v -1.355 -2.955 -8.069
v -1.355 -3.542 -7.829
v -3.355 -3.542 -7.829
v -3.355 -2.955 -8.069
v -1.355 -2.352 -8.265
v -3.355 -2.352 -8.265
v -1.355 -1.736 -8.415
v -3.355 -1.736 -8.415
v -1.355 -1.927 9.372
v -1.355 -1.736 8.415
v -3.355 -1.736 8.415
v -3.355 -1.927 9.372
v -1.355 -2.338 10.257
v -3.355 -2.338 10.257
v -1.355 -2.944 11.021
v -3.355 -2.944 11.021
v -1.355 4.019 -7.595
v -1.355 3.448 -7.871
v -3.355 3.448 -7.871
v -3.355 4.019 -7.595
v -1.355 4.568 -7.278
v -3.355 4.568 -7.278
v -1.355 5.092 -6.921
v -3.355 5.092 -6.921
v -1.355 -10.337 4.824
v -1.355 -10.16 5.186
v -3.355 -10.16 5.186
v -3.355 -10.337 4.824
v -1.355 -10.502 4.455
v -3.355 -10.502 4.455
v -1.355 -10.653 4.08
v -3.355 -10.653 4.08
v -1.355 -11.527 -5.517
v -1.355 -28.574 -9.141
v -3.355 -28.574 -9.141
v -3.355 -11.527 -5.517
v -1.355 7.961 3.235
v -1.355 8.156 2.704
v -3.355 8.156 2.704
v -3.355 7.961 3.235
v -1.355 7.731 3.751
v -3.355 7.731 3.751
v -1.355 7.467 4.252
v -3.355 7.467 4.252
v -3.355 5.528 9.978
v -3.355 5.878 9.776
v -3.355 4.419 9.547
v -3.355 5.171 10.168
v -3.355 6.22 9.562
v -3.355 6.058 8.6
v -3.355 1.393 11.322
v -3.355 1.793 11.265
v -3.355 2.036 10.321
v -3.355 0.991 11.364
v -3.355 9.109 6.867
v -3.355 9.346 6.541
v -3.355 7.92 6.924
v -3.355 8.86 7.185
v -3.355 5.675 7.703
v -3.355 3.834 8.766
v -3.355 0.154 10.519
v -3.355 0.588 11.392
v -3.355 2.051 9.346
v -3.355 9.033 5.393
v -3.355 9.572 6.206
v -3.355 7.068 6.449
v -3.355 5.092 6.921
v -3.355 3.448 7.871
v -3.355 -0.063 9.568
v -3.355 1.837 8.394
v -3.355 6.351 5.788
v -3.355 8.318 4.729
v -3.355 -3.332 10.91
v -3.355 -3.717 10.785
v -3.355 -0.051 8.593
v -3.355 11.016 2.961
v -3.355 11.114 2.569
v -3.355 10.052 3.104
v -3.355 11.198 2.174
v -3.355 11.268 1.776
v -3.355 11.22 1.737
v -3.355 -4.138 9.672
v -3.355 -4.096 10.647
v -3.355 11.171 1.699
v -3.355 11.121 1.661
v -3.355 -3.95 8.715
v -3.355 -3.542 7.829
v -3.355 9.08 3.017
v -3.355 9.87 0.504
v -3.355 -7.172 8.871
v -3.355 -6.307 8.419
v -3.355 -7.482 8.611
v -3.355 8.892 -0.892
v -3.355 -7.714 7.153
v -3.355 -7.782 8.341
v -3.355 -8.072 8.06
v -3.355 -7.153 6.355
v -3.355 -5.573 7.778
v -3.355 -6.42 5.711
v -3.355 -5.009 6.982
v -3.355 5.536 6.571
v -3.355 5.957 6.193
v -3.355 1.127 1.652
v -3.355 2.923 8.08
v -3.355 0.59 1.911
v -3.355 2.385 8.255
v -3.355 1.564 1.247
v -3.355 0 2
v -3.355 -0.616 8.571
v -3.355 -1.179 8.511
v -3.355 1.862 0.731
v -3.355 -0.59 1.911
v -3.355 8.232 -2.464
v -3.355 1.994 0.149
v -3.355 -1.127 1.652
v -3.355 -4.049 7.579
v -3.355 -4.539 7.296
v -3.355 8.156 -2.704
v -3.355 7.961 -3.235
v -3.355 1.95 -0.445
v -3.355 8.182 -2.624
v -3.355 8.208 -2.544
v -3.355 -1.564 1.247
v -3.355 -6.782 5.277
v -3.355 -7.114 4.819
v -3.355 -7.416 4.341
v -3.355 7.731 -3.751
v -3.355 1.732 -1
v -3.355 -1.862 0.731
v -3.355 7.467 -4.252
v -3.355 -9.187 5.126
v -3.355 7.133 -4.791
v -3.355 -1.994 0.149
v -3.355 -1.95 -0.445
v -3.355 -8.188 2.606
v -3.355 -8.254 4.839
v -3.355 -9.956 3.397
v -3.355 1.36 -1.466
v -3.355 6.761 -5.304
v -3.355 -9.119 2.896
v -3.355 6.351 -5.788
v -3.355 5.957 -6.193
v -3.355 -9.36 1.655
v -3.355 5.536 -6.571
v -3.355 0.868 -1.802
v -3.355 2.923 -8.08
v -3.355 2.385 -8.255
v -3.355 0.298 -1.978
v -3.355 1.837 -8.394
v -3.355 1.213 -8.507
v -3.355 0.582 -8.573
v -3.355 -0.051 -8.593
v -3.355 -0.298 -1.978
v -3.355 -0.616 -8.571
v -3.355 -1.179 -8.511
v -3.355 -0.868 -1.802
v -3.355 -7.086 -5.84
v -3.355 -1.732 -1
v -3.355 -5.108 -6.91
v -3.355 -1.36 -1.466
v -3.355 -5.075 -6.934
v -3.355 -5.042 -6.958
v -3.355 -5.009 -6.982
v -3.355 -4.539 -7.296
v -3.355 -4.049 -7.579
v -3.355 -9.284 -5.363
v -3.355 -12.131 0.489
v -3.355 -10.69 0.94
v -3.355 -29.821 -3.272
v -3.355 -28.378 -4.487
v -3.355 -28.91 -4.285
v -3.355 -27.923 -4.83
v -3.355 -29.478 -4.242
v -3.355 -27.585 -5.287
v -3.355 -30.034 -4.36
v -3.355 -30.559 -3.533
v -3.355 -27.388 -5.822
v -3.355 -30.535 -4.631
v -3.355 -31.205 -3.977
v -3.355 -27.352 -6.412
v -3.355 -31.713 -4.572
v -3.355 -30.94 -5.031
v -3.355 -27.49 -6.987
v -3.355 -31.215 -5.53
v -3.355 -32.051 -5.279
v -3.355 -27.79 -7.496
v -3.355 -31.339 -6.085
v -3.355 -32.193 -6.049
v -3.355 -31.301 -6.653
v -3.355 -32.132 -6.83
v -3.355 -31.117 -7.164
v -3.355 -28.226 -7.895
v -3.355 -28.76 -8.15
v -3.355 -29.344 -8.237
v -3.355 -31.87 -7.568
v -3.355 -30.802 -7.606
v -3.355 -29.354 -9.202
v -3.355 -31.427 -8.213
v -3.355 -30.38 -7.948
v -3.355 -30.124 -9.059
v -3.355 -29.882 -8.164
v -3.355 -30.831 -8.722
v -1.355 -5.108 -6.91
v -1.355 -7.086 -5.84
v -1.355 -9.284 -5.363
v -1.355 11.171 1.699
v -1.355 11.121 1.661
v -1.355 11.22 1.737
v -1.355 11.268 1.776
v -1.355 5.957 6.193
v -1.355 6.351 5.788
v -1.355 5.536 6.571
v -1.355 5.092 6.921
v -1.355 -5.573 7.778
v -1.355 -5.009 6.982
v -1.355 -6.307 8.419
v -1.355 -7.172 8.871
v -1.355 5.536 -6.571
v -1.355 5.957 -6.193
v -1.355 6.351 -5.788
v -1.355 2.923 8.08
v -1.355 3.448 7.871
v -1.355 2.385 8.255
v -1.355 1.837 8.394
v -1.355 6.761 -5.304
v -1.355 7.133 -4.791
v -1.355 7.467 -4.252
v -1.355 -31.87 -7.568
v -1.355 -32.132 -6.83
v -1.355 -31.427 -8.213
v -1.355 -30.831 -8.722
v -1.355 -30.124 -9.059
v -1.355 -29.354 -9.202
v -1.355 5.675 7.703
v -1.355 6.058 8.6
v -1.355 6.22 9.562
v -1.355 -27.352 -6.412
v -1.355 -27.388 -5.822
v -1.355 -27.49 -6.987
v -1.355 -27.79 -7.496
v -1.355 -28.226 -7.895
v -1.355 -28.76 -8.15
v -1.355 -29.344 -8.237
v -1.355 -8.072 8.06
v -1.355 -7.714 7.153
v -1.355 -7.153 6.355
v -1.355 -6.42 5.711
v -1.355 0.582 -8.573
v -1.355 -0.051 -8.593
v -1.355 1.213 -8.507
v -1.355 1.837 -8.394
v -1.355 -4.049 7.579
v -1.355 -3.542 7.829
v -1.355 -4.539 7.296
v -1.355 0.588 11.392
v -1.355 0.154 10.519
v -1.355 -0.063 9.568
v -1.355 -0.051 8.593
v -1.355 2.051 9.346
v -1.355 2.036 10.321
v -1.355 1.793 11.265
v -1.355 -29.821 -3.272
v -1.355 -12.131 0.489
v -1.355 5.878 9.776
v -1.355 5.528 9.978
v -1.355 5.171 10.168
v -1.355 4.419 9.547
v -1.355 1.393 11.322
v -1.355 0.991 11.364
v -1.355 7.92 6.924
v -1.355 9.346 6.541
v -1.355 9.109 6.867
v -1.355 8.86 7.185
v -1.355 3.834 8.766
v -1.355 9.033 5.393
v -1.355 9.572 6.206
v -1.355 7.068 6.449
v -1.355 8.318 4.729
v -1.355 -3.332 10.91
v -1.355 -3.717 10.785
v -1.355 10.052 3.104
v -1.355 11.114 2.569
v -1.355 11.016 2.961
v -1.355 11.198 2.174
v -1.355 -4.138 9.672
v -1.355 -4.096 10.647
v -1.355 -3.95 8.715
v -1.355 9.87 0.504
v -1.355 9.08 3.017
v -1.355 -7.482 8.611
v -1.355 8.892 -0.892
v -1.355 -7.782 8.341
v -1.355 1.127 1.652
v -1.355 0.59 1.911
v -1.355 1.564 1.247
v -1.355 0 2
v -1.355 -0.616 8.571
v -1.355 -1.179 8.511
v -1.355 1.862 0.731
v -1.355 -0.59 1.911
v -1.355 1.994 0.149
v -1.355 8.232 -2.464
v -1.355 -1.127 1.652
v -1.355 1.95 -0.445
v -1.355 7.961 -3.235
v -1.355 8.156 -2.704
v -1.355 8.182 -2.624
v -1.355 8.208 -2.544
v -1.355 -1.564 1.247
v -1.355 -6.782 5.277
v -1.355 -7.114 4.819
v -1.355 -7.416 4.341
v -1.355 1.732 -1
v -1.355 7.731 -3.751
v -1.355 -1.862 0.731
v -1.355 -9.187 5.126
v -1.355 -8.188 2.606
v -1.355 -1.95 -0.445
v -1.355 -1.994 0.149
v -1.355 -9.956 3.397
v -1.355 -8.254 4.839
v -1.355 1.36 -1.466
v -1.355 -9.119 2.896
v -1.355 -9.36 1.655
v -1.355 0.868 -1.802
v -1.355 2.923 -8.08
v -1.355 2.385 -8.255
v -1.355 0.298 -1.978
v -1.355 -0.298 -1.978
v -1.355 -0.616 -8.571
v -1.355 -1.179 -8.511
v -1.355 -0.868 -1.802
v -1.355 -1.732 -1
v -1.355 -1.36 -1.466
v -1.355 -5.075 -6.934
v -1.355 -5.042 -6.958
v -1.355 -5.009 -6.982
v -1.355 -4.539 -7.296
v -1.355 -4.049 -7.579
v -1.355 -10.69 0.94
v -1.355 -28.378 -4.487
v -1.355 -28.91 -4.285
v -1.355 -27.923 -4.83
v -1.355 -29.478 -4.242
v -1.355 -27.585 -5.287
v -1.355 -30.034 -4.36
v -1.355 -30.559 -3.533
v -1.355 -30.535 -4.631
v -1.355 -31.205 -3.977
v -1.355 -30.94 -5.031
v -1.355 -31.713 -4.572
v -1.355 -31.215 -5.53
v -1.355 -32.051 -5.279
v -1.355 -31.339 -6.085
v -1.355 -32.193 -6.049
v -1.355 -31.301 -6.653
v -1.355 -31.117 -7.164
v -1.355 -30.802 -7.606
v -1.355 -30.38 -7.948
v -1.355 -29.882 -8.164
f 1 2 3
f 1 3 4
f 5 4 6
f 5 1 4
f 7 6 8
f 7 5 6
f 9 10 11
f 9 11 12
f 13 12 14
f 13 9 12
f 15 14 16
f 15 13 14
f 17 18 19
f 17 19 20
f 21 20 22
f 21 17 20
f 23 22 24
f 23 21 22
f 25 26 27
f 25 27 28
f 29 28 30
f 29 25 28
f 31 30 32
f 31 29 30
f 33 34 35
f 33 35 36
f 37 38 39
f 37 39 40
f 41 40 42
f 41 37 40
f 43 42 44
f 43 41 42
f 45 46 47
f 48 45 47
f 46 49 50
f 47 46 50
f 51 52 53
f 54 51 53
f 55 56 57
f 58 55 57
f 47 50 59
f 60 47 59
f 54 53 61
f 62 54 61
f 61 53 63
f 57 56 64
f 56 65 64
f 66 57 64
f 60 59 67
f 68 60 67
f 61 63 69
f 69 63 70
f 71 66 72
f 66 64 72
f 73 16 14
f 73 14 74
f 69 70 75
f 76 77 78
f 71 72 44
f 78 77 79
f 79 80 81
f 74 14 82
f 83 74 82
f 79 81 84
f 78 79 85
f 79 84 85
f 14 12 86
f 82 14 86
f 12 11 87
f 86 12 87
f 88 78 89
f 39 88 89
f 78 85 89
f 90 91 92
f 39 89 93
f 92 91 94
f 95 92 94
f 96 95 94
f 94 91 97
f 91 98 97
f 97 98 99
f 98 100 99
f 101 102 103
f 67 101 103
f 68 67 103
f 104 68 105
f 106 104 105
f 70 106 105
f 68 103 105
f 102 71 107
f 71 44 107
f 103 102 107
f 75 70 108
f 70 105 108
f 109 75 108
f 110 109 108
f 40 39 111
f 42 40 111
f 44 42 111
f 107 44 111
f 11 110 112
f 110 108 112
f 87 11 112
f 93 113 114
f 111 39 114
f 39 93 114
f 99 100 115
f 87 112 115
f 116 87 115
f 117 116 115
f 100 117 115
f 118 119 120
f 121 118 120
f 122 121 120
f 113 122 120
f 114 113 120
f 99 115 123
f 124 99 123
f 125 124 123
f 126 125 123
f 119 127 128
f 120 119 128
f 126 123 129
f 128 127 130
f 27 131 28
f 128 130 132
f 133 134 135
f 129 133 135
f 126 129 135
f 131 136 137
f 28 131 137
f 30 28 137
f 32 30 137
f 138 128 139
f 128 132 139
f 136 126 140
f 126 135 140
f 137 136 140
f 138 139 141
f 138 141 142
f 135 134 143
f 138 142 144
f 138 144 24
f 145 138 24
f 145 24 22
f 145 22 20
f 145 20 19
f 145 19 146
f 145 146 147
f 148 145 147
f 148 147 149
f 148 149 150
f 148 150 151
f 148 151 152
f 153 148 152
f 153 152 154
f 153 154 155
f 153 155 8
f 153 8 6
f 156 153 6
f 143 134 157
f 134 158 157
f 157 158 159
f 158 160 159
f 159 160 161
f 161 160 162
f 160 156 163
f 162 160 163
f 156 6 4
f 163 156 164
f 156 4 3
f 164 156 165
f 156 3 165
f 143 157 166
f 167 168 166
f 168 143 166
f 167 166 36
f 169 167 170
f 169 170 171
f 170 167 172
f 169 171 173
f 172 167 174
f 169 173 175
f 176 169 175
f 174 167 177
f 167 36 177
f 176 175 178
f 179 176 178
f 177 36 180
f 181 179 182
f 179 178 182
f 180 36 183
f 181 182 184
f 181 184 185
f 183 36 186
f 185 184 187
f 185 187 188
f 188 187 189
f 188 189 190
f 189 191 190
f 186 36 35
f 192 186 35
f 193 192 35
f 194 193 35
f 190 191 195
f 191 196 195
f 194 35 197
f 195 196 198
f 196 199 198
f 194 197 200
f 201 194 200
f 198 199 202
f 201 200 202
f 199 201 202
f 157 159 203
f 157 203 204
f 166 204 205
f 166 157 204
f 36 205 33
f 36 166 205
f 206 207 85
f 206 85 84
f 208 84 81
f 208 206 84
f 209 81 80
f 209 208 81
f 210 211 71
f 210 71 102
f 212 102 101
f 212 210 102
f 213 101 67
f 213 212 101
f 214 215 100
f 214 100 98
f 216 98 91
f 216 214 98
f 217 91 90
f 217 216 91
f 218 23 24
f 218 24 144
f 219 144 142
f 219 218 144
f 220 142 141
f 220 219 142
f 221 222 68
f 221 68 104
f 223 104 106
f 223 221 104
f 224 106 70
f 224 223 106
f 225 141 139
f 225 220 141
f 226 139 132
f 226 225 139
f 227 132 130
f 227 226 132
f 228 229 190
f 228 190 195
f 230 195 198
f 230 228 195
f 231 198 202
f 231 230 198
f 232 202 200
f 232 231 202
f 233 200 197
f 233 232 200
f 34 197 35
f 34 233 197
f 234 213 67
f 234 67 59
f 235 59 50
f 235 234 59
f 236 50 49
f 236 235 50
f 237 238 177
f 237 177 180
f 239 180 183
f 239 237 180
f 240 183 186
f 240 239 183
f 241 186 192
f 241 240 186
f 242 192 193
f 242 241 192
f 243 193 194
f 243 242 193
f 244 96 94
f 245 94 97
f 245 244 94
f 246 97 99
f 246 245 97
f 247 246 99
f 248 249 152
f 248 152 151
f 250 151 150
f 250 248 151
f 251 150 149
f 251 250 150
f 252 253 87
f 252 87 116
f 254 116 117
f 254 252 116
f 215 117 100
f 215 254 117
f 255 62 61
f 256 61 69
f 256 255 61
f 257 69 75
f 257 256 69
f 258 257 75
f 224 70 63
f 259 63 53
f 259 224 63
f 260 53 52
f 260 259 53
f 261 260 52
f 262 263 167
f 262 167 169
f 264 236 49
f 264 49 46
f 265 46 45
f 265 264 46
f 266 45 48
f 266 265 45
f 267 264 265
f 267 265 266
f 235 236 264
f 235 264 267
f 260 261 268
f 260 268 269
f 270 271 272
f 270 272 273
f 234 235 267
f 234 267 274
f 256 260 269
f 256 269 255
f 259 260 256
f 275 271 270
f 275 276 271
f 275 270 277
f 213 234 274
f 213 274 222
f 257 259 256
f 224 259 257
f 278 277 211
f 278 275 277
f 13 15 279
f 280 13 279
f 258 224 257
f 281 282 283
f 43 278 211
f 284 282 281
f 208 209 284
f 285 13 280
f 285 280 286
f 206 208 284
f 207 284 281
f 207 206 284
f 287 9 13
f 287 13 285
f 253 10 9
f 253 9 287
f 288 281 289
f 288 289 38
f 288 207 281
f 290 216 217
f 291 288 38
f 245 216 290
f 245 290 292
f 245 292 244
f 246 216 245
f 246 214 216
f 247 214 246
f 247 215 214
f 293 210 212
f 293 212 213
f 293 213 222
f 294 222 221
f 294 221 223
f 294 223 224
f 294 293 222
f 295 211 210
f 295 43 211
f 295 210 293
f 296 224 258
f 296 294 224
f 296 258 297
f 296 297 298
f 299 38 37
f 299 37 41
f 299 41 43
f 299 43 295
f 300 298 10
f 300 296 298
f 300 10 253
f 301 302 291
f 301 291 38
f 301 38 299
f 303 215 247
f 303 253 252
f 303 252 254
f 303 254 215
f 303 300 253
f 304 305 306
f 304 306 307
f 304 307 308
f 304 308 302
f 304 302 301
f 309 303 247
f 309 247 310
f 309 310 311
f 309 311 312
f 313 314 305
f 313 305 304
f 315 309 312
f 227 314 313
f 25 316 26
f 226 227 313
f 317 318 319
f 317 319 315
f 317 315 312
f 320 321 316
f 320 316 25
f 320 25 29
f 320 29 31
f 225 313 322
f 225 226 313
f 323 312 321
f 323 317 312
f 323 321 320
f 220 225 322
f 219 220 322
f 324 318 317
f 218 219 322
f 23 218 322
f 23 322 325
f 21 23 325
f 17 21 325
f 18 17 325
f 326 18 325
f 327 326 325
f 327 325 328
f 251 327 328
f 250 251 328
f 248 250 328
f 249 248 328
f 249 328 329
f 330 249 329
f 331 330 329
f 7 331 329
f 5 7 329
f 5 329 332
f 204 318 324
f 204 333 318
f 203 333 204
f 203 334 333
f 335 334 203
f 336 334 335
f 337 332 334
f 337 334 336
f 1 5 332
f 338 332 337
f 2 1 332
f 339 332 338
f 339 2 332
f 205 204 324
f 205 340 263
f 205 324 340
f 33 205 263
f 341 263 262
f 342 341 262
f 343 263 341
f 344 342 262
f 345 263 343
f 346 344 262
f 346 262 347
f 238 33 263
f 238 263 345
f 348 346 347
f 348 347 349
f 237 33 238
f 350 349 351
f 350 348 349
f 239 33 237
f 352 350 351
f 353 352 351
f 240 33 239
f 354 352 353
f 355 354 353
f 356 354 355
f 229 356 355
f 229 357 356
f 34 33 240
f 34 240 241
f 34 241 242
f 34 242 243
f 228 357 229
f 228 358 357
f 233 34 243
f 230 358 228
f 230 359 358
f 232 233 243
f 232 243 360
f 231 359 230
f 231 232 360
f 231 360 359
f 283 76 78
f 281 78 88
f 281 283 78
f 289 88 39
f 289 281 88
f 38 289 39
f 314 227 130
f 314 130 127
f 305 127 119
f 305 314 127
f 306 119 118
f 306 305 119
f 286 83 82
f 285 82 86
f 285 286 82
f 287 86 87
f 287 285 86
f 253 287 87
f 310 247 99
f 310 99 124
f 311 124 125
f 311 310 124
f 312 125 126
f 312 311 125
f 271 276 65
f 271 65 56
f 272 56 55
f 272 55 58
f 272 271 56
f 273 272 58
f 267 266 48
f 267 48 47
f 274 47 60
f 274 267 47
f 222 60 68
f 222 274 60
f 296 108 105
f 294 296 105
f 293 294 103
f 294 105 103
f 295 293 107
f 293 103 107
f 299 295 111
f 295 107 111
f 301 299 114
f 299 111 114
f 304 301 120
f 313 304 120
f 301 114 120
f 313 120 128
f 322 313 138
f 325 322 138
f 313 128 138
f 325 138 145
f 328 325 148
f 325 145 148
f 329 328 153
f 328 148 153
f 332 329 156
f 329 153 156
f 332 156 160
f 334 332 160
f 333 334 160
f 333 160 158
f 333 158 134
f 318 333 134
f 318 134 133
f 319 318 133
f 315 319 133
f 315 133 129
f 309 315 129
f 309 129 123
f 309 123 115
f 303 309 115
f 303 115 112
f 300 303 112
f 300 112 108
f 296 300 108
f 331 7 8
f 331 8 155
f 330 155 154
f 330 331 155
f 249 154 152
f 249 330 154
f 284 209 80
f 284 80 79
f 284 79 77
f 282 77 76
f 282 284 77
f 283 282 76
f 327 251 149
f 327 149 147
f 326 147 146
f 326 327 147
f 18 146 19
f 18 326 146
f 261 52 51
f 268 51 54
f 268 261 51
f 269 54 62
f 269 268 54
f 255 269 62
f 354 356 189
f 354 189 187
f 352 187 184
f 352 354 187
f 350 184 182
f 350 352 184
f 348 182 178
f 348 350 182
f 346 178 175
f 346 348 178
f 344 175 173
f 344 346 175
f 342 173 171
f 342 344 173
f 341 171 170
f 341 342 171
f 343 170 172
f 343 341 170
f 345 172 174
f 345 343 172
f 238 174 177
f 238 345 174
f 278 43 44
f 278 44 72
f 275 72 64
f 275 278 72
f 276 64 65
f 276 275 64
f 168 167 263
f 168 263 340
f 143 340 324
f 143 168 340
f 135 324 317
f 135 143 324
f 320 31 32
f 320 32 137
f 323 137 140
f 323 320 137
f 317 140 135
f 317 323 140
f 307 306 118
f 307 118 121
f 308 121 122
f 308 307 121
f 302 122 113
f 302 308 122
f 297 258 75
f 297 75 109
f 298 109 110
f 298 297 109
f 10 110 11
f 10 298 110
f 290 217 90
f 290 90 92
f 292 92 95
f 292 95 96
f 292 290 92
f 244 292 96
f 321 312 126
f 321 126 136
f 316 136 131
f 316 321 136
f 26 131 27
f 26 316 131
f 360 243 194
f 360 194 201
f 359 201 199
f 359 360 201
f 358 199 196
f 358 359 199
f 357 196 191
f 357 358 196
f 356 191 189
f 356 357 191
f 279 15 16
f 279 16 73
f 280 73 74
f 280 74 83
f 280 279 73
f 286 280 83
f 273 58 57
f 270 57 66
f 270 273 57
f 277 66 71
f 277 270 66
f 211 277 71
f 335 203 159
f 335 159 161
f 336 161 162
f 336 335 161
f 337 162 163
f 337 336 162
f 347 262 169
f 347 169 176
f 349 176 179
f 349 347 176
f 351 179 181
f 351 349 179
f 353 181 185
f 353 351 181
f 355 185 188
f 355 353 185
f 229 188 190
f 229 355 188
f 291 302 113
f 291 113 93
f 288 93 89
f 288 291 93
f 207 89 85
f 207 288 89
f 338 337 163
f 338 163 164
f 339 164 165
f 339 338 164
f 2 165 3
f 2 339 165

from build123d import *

# Parameters (mm, degrees)
SKETCH1_R           = 1.5
BOSS_EXTRUDE1_DEPTH = 2
SKETCH3_OUTSIDE_W   = 31.914
SKETCH3_OUTSIDE_H   = 31.796
SKETCH3_OUTSIDE_R   = 11.40725
CUT_EXTRUDE1_DEPTH  = 17.630863493
SKETCH4_R           = 2
CUT_EXTRUDE2_DEPTH  = 17.245136509
BOSS_EXTRUDE3_DEPTH = 2
CUT_EXTRUDE3_DEPTH  = 35.211805454
FILLET1_R           = 8


with BuildPart() as part:
    # Sketch1 → Boss-Extrude1 (new body)
    with BuildSketch(Plane(origin=(-1.354941904, 0, 0), x_dir=(0, 0, -1), z_dir=(1, 0, 0))):
        with BuildLine():
            ThreePointArc((-11.66138775, 0.780827758), (-10.210393031, 0.057188521), (-8.592596732, -0.051322118))
            ThreePointArc((-8.592596732, -0.051322118), (-8.545678016, -0.898186953), (-8.415498346, -1.736300708))
            ThreePointArc((-8.415498346, -1.736300708), (-9.975381284, -2.178798893), (-11.24421523, -3.188303642))
            ThreePointArc((-11.24421523, -3.188303642), (-11.115473034, -3.611636122), (-10.97079907, -4.029792056))
            ThreePointArc((-10.97079907, -4.029792056), (-9.350918841, -4.100696673), (-7.828853128, -3.541809038))
            ThreePointArc((-7.828853128, -3.541809038), (-7.441539788, -4.296375), (-6.981723166, -5.009081172))
            ThreePointArc((-6.981723166, -5.009081172), (-8.226766912, -6.047784929), (-8.975301827, -7.486094667))
            ThreePointArc((-8.975301827, -7.486094667), (-8.685505148, -7.820463962), (-8.383259564, -8.143624213))
            ThreePointArc((-8.383259564, -8.143624213), (-6.874585833, -7.549534157), (-5.711429695, -6.419884999))
            ThreePointArc((-5.711429695, -6.419884999), (-5.050691727, -6.951680778), (-4.340744624, -7.415745996))
            ThreePointArc((-4.340744624, -7.415745996), (-5.055669804, -8.871054007), (-5.154477201, -10.489471914))
            ThreePointArc((-5.154477201, -10.489471914), (-4.753734516, -10.677062536), (-4.34617832, -10.849349762))
            ThreePointArc((-4.34617832, -10.849349762), (-3.209574481, -9.692988601), (-2.606448181, -8.187904521))
            ThreePointArc((-2.606448181, -8.187904521), (-1.786533181, -8.404977796), (-0.949211902, -8.540160966))
            ThreePointArc((-0.949211902, -8.540160966), (-1.010401457, -10.160437258), (-0.442396639, -11.679124174))
            ThreePointArc((-0.442396639, -11.679124174), (0, -11.6875), (0.442396639, -11.679124174))
            ThreePointArc((0.442396639, -11.679124174), (1.010401457, -10.160437258), (0.949211902, -8.540160966))
            ThreePointArc((0.949211902, -8.540160966), (1.786533181, -8.404977796), (2.606448181, -8.187904521))
            ThreePointArc((2.606448181, -8.187904521), (3.209574481, -9.692988601), (4.34617832, -10.849349762))
            ThreePointArc((4.34617832, -10.849349762), (4.753734516, -10.677062536), (5.154477201, -10.489471914))
            ThreePointArc((5.154477201, -10.489471914), (5.055669804, -8.871054007), (4.340744624, -7.415745996))
            ThreePointArc((4.340744624, -7.415745996), (5.050691727, -6.951680778), (5.711429695, -6.419884999))
            ThreePointArc((5.711429695, -6.419884999), (6.874585833, -7.549534157), (8.383259564, -8.143624213))
            ThreePointArc((8.383259564, -8.143624213), (8.685505148, -7.820463962), (8.975301827, -7.486094667))
            ThreePointArc((8.975301827, -7.486094667), (8.226766912, -6.047784929), (6.981723166, -5.009081172))
            ThreePointArc((6.981723166, -5.009081172), (7.441539788, -4.296375), (7.828853128, -3.541809038))
            ThreePointArc((7.828853128, -3.541809038), (9.350918841, -4.100696673), (10.97079907, -4.029792056))
            ThreePointArc((10.97079907, -4.029792056), (11.115473034, -3.611636122), (11.24421523, -3.188303642))
            ThreePointArc((11.24421523, -3.188303642), (9.975381284, -2.178798893), (8.415498346, -1.736300708))
            ThreePointArc((8.415498346, -1.736300708), (8.545678016, -0.898186953), (8.592596732, -0.051322118))
            ThreePointArc((8.592596732, -0.051322118), (10.210393031, 0.057188521), (11.66138775, 0.780827758))
            ThreePointArc((11.66138775, 0.780827758), (11.623474652, 1.221676414), (11.568901669, 1.660774047))
            ThreePointArc((11.568901669, 1.660774047), (9.999161608, 2.066921265), (8.394157409, 1.836701922))
            ThreePointArc((8.394157409, 1.836701922), (8.17219088, 2.655305778), (7.8706023, 3.448038862))
            ThreePointArc((7.8706023, 3.448038862), (9.304397507, 4.205185299), (10.335616548, 5.456435359))
            ThreePointArc((10.335616548, 5.456435359), (10.121671907, 5.84375), (9.893219909, 6.222688815))
            ThreePointArc((9.893219909, 6.222688815), (8.29399605, 5.955251959), (6.921390398, 5.092122104))
            ThreePointArc((6.921390398, 5.092122104), (6.385657699, 5.749672018), (5.787709228, 6.351202599))
            ThreePointArc((5.787709228, 6.351202599), (6.789587127, 7.626067336), (7.222723349, 9.188575716))
            ThreePointArc((7.222723349, 9.188575716), (6.869740136, 9.455386122), (6.506910549, 9.708644156))
            ThreePointArc((6.506910549, 9.708644156), (5.154723227, 8.813865487), (4.251852108, 7.467068114))
            ThreePointArc((4.251852108, 7.467068114), (3.49498629, 7.849867731), (2.704068651, 8.156185707))
            ThreePointArc((2.704068651, 8.156185707), (3.100795451, 9.728333051), (2.860955666, 11.331927856))
            ThreePointArc((2.860955666, 11.331927856), (2.429967886, 11.432100084), (1.995497243, 11.515886722))
            ThreePointArc((1.995497243, 11.515886722), (1.124151929, 10.148481601), (0.847129962, 8.55089021))
            ThreePointArc((0.847129962, 8.55089021), (0, 8.59275), (-0.847129962, 8.55089021))
            ThreePointArc((-0.847129962, 8.55089021), (-1.124151929, 10.148481601), (-1.995497243, 11.515886722))
            ThreePointArc((-1.995497243, 11.515886722), (-2.429967886, 11.432100084), (-2.860955666, 11.331927856))
            ThreePointArc((-2.860955666, 11.331927856), (-3.100795451, 9.728333051), (-2.704068651, 8.156185707))
            ThreePointArc((-2.704068651, 8.156185707), (-3.49498629, 7.849867731), (-4.251852108, 7.467068114))
            ThreePointArc((-4.251852108, 7.467068114), (-5.154723227, 8.813865487), (-6.506910549, 9.708644156))
            ThreePointArc((-6.506910549, 9.708644156), (-6.869740136, 9.455386122), (-7.222723349, 9.188575716))
            ThreePointArc((-7.222723349, 9.188575716), (-6.789587127, 7.626067336), (-5.787709228, 6.351202599))
            ThreePointArc((-5.787709228, 6.351202599), (-6.385657699, 5.749672018), (-6.921390398, 5.092122104))
            ThreePointArc((-6.921390398, 5.092122104), (-8.29399605, 5.955251959), (-9.893219909, 6.222688815))
            ThreePointArc((-9.893219909, 6.222688815), (-10.121671907, 5.84375), (-10.335616548, 5.456435359))
            ThreePointArc((-10.335616548, 5.456435359), (-9.304397507, 4.205185299), (-7.8706023, 3.448038862))
            ThreePointArc((-7.8706023, 3.448038862), (-8.17219088, 2.655305778), (-8.394157409, 1.836701922))
            ThreePointArc((-8.394157409, 1.836701922), (-9.999161608, 2.066921265), (-11.568901669, 1.660774047))
            ThreePointArc((-11.568901669, 1.660774047), (-11.623474652, 1.221676414), (-11.66138775, 0.780827758))
        make_face()
        with Locations(Location((0, 0, 0), (0, 0, 180))):
            Circle(SKETCH1_R, mode=Mode.SUBTRACT)
    extrude(amount=-BOSS_EXTRUDE1_DEPTH)

    # Sketch3 outside → Cut-Extrude1 (cut, through all)
    with BuildSketch(Plane(origin=(-1.354941904, 0, 0), x_dir=(0, 0, -1), z_dir=(1, 0, 0))):
        with Locations((0, -0.086)):
            Rectangle(SKETCH3_OUTSIDE_W, SKETCH3_OUTSIDE_H)
        Circle(SKETCH3_OUTSIDE_R, mode=Mode.SUBTRACT)
    extrude(amount=-CUT_EXTRUDE1_DEPTH, mode=Mode.SUBTRACT)

    # Sketch4 → Cut-Extrude2 (cut, through all)
    with BuildSketch(Plane.ZY.offset(3.354941904)):
        Circle(SKETCH4_R)
    extrude(amount=-CUT_EXTRUDE2_DEPTH, mode=Mode.SUBTRACT)

    # Sketch5 → Boss-Extrude3 (add)
    with BuildSketch(Plane(origin=(-1.354941904, 0, 0), x_dir=(0, 0, -1), z_dir=(1, 0, 0))):
        with BuildLine():
            Line((5.821527343, -27.388132821), (0.895701941, -4.213946322))
            Line((0.895701941, -4.213946322), (-2.171319843, -4.213946322))
            Line((-2.171319843, -4.213946322), (3.27164281, -29.821072303))
            ThreePointArc((3.27164281, -29.821072303), (4.572168507, -31.713348935), (6.829820684, -32.131780033))
            Line((6.829820684, -32.131780033), (6.653174106, -31.300723223))
            ThreePointArc((6.653174106, -31.300723223), (4.281055523, -29.760251404), (5.821527343, -27.388132821))
        make_face()
        with BuildLine():
            Line((3.962723726, -4.213946322), (0.895701941, -4.213946322))
            Line((0.895701941, -4.213946322), (5.821527343, -27.388132821))
            ThreePointArc((5.821527343, -27.388132821), (7.495991507, -27.790136099), (8.237350725, -29.344428022))
            ThreePointArc((8.237350725, -29.344428022), (7.791642647, -30.603068804), (6.653174106, -31.300723223))
            Line((6.653174106, -31.300723223), (6.829820684, -32.131780033))
            ThreePointArc((6.829820684, -32.131780033), (8.722097316, -30.831254336), (9.140528414, -28.573602159))
            Line((9.140528414, -28.573602159), (3.962723726, -4.213946322))
        make_face()
    extrude(amount=-BOSS_EXTRUDE3_DEPTH)

    # Sketch6 → Cut-Extrude3 (cut, through all)
    with BuildSketch(Plane(origin=(-1.354941904, 0, 0), x_dir=(0, 0, -1), z_dir=(1, 0, 0))):
        with BuildLine():
            ThreePointArc((4.60855611, -7.252348802), (8.250847615, 2.39976378), (0, 8.59275))
            Line((0, 8.59275), (0, 11.449359201))
            ThreePointArc((0, 11.449359201), (11.128561829, 2.691270657), (5.231728933, -10.184146429))
            Line((5.231728933, -10.184146429), (4.60855611, -7.252348802))
        make_face()
        with BuildLine():
            ThreePointArc((-1.878840334, -8.384826269), (-1.570637651, -8.447984963), (-1.260329494, -8.499818947))
            Line((-1.260329494, -8.499818947), (-0.637156671, -11.431616574))
            ThreePointArc((-0.637156671, -11.431616574), (-1.575646482, -11.340421698), (-2.503449753, -11.172312449))
            Line((-2.503449753, -11.172312449), (-1.878840334, -8.384826269))
        make_face()
    extrude(amount=-CUT_EXTRUDE3_DEPTH, mode=Mode.SUBTRACT)

    # Fillet1
    # the kernel refuses this fillet: 8 mm, written as the material it adds along each edge
    with BuildSketch(Plane(origin=(-3.354941904, -8.499818947, 1.260329494), x_dir=(0, -0.978147600733804, -0.20791169081776692), z_dir=(1, 0, 0))) as fillet1_piece_1:
        with BuildLine():
            CenterArc((3.711828979, -8), FILLET1_R, 90, 32.486450305)
            Line((-0.58497216, -1.251852108), (-0.670908182, -1.11688915))
            ThreePointArc((-0.670908182, -1.11688915), (-0.412236702, -0.569968342), (-0.149931796, 0.055861046))
            Line((-0.149931796, 0.055861046), (0, 0.16))
            Line((0, 0.16), (3.711828979, 0.16))
            Line((3.711828979, 0.16), (3.711828979, 0))
        make_face()
    extrude(amount=2)
    with BuildSketch(Plane(origin=(-3.354941904, -7.252348802, -4.60855611), x_dir=(0, 0.6817347093363165, -0.7315994710810882), z_dir=(1, 0, 0))) as fillet1_piece_2:
        with BuildLine():
            CenterArc((4.609202788, -7.864888151), FILLET1_R, 100.545143381, 48.475508098)
            Line((-2.24962028, -3.747055453), (-2.386796741, -3.664698799))
            Line((-2.386796741, -3.664698799), (-0.137176461, 0.082356654))
            Line((-0.137176461, 0.082356654), (0.029281628, 0.157297763))
            ThreePointArc((0.029281628, 0.157297763), (1.57256069, 0.014877208), (3.115839752, 0.157297763))
            Line((3.115839752, 0.157297763), (3.14512138, 0))
        make_face()
    extrude(amount=2)
    with BuildSketch(Plane(origin=(-1.354941904, 8.55089021, 0.847129962), x_dir=(0, 0.9533192219499187, 0.3019643373989743), z_dir=(-1, 0, 0))) as fillet1_piece_3:
        with BuildLine():
            CenterArc((5.310026661, 7.560828727), FILLET1_R, 214.236741242, 36.690361487)
            Line((-1.30373306, 3.059919669), (-1.436008254, 2.969901488))
            ThreePointArc((-1.436008254, 2.969901488), (-0.64959553, 1.530927434), (-0.156551158, -0.03304141))
            Line((-0.156551158, -0.03304141), (0.052283339, -0.151216575))
            ThreePointArc((0.052283339, -0.151216575), (1.347929845, 0.066447687), (2.64357635, -0.151216575))
            Line((2.64357635, -0.151216575), (2.69585969, 0))
        make_face()
    extrude(amount=2)


solid = part.part
